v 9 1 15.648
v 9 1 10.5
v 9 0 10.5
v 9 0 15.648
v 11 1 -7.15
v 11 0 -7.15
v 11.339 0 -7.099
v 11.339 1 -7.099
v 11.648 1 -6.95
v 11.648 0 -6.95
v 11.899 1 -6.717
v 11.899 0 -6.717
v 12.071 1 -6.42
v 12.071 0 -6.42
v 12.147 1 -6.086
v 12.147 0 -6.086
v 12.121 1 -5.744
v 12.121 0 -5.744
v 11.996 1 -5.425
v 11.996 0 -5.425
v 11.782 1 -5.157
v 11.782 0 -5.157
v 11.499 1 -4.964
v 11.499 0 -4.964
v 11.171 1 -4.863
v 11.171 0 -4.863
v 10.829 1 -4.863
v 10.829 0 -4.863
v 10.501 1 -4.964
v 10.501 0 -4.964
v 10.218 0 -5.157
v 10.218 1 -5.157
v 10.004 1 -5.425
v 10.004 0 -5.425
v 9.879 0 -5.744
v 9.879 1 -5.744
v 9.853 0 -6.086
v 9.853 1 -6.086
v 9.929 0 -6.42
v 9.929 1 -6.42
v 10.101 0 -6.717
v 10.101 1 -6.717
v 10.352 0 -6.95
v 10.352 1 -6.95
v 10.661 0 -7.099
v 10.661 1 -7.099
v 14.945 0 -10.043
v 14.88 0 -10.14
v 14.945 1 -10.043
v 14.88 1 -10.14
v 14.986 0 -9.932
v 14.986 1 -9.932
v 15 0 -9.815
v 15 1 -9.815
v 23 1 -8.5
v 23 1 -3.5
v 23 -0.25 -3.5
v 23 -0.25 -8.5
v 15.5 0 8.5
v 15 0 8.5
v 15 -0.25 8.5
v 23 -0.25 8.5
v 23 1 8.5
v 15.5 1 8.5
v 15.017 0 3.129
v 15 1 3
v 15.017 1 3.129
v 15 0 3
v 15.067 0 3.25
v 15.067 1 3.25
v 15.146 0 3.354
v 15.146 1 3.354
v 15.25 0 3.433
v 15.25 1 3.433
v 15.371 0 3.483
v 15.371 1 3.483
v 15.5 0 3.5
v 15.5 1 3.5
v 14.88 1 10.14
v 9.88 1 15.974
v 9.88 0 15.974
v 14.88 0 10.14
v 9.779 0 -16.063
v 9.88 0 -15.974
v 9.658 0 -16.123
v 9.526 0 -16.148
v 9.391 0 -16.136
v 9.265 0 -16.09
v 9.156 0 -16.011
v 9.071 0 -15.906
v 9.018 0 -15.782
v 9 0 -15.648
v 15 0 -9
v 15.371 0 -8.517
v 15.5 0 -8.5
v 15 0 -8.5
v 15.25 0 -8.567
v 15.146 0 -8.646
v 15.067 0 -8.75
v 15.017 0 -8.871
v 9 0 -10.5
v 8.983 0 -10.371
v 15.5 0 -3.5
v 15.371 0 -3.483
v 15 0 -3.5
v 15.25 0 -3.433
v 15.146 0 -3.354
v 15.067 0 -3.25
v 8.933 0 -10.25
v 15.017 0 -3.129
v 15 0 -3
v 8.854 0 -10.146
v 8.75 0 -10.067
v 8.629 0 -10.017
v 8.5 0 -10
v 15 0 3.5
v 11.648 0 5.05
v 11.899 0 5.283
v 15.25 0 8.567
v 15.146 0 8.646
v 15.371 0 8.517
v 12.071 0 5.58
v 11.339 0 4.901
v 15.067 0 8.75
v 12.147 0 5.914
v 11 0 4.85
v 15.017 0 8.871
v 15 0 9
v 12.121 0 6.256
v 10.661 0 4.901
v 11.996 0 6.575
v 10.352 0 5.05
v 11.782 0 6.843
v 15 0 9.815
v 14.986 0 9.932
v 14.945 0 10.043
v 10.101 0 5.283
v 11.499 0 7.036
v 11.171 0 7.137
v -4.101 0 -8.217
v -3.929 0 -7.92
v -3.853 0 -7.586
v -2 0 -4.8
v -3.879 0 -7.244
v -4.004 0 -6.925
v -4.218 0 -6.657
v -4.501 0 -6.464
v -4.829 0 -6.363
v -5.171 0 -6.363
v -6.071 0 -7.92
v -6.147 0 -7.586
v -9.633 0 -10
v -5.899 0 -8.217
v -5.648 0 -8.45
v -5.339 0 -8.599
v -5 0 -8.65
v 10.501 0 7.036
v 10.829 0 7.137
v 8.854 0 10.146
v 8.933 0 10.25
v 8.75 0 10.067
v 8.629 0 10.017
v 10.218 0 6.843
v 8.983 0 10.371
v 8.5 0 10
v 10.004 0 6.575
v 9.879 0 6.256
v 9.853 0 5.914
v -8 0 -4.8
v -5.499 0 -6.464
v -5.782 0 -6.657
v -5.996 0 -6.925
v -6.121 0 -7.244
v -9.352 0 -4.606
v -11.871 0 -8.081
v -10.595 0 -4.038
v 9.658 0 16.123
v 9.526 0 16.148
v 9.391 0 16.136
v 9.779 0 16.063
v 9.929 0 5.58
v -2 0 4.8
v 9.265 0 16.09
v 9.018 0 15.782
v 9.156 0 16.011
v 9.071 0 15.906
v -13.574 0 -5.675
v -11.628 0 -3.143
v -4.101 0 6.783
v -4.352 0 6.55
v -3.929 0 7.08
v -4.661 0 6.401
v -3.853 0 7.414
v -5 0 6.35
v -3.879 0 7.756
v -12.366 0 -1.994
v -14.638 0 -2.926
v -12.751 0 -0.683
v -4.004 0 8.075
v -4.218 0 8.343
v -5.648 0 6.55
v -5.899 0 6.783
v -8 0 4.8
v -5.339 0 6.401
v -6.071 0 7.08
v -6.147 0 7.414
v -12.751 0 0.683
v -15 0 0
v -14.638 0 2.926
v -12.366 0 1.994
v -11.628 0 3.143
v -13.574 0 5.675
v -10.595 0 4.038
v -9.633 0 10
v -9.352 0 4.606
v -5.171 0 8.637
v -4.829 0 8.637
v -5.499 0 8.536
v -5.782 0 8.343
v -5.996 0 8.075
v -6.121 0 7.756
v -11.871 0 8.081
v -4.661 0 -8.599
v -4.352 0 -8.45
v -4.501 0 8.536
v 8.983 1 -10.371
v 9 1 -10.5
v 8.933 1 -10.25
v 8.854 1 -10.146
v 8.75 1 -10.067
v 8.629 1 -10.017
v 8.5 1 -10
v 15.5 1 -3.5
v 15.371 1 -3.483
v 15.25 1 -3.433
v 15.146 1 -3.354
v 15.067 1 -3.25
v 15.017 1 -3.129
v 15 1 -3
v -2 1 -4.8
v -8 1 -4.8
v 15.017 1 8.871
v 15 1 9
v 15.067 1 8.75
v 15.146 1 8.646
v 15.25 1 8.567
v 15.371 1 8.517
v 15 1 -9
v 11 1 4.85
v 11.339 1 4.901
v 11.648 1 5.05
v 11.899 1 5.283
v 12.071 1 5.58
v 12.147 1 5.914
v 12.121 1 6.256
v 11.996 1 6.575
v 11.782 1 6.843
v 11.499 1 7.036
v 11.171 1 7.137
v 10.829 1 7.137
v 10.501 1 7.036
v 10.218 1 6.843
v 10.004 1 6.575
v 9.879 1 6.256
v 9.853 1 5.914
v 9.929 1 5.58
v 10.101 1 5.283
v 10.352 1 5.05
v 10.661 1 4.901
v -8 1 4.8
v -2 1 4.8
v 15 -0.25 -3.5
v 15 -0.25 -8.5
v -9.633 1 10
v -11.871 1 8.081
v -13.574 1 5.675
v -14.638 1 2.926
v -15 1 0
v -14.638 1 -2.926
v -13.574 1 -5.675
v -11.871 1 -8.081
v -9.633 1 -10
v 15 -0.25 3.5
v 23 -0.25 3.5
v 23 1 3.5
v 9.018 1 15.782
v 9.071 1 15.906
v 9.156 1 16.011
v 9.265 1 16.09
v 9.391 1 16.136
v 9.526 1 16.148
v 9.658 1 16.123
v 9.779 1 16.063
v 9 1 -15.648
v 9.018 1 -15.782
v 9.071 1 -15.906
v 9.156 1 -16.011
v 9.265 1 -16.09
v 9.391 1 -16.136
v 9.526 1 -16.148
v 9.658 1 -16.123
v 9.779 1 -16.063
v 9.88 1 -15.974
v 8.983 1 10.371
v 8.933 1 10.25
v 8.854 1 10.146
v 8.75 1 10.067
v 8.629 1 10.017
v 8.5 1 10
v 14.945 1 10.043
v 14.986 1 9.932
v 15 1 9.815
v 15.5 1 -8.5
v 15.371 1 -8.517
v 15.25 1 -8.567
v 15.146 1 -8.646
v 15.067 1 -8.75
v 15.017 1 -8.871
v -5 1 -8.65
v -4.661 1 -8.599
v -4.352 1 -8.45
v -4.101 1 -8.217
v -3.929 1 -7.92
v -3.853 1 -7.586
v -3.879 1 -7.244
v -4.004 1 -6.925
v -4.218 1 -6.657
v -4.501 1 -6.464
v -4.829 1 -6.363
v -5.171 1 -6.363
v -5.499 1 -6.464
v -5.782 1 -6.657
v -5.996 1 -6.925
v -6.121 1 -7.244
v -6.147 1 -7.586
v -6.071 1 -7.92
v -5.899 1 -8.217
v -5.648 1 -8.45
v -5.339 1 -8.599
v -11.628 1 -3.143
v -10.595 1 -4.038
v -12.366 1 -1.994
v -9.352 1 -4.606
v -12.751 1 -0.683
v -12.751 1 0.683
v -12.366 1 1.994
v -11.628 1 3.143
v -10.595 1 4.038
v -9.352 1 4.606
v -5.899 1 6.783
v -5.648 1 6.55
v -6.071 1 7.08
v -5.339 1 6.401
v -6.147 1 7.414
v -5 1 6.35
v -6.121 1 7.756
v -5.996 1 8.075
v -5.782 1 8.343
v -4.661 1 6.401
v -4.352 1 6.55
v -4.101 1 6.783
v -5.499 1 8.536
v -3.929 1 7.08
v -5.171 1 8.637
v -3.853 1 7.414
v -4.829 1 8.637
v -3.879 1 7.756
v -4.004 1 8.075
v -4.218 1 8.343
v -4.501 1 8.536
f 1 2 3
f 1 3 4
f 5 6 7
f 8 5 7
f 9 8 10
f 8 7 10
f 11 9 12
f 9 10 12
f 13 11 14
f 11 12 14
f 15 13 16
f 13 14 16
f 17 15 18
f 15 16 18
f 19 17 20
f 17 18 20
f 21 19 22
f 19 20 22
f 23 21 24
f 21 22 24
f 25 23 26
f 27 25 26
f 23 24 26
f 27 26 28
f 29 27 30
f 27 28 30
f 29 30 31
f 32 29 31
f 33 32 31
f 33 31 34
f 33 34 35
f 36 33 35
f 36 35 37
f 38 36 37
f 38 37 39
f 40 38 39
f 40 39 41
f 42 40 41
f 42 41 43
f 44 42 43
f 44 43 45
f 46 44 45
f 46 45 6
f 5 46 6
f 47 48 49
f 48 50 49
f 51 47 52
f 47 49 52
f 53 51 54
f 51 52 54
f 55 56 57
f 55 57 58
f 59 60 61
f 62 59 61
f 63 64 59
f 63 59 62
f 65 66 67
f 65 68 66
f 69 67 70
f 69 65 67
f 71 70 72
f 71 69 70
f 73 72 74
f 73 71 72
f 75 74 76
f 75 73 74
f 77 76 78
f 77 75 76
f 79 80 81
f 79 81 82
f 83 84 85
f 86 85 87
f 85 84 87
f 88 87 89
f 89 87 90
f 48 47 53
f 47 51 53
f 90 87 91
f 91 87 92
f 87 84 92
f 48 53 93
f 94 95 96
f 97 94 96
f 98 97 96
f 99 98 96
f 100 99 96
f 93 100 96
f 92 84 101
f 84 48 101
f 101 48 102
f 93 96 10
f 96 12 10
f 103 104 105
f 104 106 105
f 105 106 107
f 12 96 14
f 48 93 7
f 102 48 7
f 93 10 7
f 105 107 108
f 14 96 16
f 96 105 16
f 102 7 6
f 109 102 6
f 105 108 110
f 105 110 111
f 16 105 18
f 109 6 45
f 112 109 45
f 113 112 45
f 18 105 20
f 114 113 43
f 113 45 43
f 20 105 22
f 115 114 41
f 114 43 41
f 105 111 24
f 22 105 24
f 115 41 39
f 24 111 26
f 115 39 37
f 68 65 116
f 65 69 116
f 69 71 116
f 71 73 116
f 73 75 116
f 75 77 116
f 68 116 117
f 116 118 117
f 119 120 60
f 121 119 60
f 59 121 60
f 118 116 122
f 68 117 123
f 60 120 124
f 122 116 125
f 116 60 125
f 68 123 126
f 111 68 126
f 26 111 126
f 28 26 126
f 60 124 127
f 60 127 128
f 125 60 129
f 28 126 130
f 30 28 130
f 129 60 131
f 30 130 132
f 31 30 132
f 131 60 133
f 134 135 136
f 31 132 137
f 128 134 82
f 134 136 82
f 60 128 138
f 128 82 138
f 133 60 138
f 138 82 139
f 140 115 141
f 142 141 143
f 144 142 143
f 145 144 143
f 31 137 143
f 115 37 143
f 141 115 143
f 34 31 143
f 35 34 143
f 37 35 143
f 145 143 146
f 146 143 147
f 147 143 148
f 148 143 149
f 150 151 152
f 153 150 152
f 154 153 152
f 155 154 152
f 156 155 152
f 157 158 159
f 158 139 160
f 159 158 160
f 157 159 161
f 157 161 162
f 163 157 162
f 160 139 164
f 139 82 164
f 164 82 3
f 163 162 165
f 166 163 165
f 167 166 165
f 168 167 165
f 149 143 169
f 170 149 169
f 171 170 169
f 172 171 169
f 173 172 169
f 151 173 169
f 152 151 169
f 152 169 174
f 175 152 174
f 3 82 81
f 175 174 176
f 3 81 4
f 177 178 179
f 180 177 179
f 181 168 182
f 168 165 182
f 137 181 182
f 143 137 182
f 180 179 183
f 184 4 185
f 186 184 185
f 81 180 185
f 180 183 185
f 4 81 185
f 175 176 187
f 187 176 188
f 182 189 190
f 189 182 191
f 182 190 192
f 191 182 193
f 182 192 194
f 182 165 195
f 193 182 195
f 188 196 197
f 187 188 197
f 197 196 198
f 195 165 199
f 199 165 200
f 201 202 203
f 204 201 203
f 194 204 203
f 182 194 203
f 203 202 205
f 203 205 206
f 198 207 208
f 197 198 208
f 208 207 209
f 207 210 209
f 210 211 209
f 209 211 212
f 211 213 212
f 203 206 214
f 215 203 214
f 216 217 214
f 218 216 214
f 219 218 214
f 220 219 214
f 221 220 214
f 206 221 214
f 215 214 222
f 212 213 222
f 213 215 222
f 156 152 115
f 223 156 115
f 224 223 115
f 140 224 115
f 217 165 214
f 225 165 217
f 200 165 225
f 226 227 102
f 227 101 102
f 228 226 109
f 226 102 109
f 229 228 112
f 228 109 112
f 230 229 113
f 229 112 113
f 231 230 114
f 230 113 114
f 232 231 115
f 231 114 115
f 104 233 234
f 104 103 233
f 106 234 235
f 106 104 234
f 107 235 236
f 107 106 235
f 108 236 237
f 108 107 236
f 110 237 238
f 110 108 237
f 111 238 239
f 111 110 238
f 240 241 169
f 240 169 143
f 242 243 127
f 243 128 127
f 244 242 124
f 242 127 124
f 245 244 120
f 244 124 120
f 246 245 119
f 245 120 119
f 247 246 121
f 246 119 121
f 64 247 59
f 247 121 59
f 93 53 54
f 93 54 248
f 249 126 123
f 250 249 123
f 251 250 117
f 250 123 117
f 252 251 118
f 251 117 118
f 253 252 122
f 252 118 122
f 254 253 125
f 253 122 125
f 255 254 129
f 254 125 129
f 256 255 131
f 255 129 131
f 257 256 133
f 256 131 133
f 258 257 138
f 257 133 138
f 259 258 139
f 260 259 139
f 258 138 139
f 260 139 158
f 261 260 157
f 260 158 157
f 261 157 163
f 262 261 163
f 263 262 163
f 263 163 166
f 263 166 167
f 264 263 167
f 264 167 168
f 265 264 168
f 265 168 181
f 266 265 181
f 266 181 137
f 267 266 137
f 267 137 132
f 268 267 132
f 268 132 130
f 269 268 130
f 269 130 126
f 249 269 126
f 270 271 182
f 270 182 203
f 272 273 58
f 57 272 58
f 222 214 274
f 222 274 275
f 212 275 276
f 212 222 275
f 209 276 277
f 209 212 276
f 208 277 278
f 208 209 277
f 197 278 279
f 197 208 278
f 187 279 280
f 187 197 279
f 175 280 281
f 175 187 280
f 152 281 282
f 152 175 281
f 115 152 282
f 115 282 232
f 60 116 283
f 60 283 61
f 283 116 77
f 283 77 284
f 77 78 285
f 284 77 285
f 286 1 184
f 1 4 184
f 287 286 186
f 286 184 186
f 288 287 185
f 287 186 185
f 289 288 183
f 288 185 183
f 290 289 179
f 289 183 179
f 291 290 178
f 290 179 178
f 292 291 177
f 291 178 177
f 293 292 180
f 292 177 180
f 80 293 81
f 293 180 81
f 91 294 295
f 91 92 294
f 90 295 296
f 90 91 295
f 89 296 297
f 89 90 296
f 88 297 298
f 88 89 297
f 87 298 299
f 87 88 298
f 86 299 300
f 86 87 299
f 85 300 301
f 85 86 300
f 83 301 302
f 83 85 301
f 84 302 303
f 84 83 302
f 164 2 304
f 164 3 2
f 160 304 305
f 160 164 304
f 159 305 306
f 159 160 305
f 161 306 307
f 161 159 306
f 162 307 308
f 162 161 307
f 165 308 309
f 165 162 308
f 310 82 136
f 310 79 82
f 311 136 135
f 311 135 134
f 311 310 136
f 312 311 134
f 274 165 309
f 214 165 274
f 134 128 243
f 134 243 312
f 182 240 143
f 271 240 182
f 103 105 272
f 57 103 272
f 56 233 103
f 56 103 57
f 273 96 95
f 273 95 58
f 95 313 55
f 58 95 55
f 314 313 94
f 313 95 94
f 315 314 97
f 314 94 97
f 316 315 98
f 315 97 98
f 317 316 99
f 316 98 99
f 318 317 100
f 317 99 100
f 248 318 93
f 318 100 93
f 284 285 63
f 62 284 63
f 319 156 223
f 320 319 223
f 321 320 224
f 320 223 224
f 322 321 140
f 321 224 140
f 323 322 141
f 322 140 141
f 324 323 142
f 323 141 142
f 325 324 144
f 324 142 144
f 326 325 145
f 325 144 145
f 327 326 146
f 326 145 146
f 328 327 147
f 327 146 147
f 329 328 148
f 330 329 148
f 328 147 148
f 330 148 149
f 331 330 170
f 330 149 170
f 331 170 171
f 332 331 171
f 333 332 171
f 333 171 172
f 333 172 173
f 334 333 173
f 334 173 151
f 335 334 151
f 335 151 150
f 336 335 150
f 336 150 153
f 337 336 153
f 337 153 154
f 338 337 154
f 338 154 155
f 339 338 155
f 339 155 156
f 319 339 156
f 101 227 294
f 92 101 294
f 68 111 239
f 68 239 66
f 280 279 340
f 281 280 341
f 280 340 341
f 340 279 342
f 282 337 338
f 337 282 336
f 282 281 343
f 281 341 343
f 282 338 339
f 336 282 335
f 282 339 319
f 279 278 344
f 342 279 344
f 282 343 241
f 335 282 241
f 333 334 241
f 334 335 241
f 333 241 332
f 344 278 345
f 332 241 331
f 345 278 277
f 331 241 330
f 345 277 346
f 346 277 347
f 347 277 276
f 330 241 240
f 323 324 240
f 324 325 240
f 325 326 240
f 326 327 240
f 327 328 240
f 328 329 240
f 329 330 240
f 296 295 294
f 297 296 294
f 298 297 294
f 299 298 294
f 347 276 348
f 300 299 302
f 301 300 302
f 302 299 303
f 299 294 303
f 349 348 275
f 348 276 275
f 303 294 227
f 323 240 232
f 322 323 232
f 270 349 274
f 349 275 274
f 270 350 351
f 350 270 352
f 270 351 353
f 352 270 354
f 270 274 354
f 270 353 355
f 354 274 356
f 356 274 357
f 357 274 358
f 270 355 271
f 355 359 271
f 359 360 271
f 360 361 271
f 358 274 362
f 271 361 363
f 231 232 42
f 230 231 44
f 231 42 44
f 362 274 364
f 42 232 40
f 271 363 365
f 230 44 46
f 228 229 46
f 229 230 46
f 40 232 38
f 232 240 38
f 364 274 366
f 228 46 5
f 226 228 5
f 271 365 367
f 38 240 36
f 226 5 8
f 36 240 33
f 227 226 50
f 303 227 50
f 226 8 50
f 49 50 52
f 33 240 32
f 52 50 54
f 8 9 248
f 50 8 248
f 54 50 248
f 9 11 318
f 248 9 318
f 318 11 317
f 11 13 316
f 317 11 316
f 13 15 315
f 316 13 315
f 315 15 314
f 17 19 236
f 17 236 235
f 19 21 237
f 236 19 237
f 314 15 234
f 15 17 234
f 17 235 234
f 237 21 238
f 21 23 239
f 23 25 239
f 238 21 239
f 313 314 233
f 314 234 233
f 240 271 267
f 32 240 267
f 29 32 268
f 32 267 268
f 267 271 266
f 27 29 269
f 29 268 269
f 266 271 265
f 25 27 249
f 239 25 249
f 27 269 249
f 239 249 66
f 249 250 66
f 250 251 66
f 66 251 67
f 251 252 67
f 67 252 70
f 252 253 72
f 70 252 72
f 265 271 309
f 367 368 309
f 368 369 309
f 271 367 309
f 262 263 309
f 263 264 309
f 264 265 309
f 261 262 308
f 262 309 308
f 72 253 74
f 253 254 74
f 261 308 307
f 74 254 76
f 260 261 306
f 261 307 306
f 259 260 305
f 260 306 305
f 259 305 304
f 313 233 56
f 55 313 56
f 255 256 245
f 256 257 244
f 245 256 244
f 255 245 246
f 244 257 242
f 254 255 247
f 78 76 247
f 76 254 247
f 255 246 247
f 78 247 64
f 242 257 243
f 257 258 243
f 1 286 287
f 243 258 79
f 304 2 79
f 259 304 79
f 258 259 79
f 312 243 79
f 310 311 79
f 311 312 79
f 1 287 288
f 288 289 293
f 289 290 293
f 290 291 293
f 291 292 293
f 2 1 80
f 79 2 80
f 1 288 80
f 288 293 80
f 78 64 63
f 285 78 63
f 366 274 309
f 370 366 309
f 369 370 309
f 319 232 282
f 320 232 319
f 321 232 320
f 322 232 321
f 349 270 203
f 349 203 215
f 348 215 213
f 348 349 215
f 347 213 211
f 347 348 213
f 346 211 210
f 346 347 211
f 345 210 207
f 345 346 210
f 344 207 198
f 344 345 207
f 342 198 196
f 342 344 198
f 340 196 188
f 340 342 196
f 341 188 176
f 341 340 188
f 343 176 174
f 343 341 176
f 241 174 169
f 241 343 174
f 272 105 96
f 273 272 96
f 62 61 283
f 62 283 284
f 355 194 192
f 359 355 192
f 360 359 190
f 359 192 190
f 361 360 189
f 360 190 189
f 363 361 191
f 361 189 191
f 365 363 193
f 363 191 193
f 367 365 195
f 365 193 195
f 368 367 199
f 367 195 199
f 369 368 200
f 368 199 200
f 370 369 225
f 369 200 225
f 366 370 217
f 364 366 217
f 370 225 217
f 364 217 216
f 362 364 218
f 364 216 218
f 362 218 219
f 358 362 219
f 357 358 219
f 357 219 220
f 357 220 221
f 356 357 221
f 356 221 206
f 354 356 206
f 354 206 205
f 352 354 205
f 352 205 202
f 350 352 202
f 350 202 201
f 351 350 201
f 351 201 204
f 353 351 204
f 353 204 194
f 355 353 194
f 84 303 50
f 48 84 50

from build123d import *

# Parameters (mm, degrees)
BOSS_EXTRUDE1_DEPTH  = 1
CUT_EXTRUDE1_DEPTH   = 1.25
BOSS_EXTRUDE2_DEPTH  = 1
FILLET1_R            = 0.5
FILLET2_R            = 0.5
SKETCH5_W            = 8
SKETCH5_H            = 5
BOSS_EXTRUDE3_DEPTH  = 1.25
FILLET3_R            = 0.5
FILLET1_OF_MIRROR6_R = 0.5
FILLET4_R            = 0.5
SKETCH6_R            = 1.15
CUT_EXTRUDE2_DEPTH   = 29.120631136


with BuildPart() as part:
    # Sketch2 → Boss-Extrude1 (new body)
    with BuildSketch(Plane(origin=(0, 0, 0), x_dir=(1, 0, 0), z_dir=(0, 1, 0))):
        with BuildLine():
            Line((15, -10), (-9.633249581, -10))
            ThreePointArc((-9.633249581, -10), (-15, 0), (-9.633249581, 10))
            Line((-9.633249581, 10), (15, 10))
            Line((15, 10), (15, -10))
        make_face()
    extrude(amount=BOSS_EXTRUDE1_DEPTH)

    # Sketch3 → Cut-Extrude1 (cut)
    with BuildSketch(Plane(origin=(0, 1, 0), x_dir=(1, 0, 0), z_dir=(0, 1, 0))):
        with BuildLine():
            Line((-8, 4.8), (-2, 4.8))
            Line((-2, 4.8), (-2, -4.8))
            Line((-2, -4.8), (-8, -4.8))
            ThreePointArc((-8, -4.8), (-12.8, 0), (-8, 4.8))
        make_face()
    extrude(amount=-CUT_EXTRUDE1_DEPTH, mode=Mode.SUBTRACT)

    # Sketch4 → Boss-Extrude2 (add)
    with BuildSketch(Plane(origin=(0, 1, 0), x_dir=(1, 0, 0), z_dir=(0, 1, 0))):
        Polygon((9, 10), (9, 17), (15, 10), align=None)
    boss_extrude2 = extrude(amount=-BOSS_EXTRUDE2_DEPTH)

    # Fillet1
    fillet1_edges = [part.edges().sort_by_distance(p)[0] for p in [
        (9, 0.5, -17),
    ]]
    fillet(fillet1_edges, radius=FILLET1_R)

    # Fillet2
    fillet2_edges = [part.edges().sort_by_distance(p)[0] for p in [
        (9, 0.5, -10),
    ]]
    fillet(fillet2_edges, radius=FILLET2_R)

    # Sketch5 → Boss-Extrude3 (add)
    with BuildSketch(Plane(origin=(0, 1, 0), x_dir=(1, 0, 0), z_dir=(0, 1, 0))):
        with Locations((19, 6)):
            Rectangle(SKETCH5_W, SKETCH5_H)
    boss_extrude3 = extrude(amount=-BOSS_EXTRUDE3_DEPTH)

    # Fillet3
    fillet3_edges = [part.edges().sort_by_distance(p)[0] for p in [
        (15, 0.5, -3.5),
        (15, 0.5, -8.5),
        (15, 0.5, -10),
    ]]
    fillet(fillet3_edges, radius=FILLET3_R)

    # Mirror6: Boss-Extrude2, Boss-Extrude3 across plane
    add(boss_extrude2.mirror(Plane.XY))
    add(boss_extrude3.mirror(Plane.XY))

    # Fillet1 of Mirror6
    fillet1_of_mirror6_edges = [part.edges().sort_by_distance(p)[0] for p in [
        (9, 0.5, 17),
    ]]
    fillet(fillet1_of_mirror6_edges, radius=FILLET1_OF_MIRROR6_R)

    # Fillet4
    fillet4_edges = [part.edges().sort_by_distance(p)[0] for p in [
        (9, 0.5, 10),
        (15, 0.5, 8.5),
        (15, 0.5, 3.5),
        (15, 0.5, 10),
    ]]
    fillet(fillet4_edges, radius=FILLET4_R)

    # Sketch6 → Cut-Extrude2 (cut, through all)
    with BuildSketch(Plane.XZ):
        with Locations(Location((-5, -7.5, 0), (0, 0, 270))):
            Circle(SKETCH6_R)
        with Locations(Location((11, -6, 0), (0, 0, 270))):
            Circle(SKETCH6_R)
        with Locations(Location((11, 6, 0), (0, 0, 270))):
            Circle(SKETCH6_R)
        with Locations(Location((-5, 7.5, 0), (0, 0, 270))):
            Circle(SKETCH6_R)
    extrude(amount=-CUT_EXTRUDE2_DEPTH, mode=Mode.SUBTRACT)


solid = part.part
